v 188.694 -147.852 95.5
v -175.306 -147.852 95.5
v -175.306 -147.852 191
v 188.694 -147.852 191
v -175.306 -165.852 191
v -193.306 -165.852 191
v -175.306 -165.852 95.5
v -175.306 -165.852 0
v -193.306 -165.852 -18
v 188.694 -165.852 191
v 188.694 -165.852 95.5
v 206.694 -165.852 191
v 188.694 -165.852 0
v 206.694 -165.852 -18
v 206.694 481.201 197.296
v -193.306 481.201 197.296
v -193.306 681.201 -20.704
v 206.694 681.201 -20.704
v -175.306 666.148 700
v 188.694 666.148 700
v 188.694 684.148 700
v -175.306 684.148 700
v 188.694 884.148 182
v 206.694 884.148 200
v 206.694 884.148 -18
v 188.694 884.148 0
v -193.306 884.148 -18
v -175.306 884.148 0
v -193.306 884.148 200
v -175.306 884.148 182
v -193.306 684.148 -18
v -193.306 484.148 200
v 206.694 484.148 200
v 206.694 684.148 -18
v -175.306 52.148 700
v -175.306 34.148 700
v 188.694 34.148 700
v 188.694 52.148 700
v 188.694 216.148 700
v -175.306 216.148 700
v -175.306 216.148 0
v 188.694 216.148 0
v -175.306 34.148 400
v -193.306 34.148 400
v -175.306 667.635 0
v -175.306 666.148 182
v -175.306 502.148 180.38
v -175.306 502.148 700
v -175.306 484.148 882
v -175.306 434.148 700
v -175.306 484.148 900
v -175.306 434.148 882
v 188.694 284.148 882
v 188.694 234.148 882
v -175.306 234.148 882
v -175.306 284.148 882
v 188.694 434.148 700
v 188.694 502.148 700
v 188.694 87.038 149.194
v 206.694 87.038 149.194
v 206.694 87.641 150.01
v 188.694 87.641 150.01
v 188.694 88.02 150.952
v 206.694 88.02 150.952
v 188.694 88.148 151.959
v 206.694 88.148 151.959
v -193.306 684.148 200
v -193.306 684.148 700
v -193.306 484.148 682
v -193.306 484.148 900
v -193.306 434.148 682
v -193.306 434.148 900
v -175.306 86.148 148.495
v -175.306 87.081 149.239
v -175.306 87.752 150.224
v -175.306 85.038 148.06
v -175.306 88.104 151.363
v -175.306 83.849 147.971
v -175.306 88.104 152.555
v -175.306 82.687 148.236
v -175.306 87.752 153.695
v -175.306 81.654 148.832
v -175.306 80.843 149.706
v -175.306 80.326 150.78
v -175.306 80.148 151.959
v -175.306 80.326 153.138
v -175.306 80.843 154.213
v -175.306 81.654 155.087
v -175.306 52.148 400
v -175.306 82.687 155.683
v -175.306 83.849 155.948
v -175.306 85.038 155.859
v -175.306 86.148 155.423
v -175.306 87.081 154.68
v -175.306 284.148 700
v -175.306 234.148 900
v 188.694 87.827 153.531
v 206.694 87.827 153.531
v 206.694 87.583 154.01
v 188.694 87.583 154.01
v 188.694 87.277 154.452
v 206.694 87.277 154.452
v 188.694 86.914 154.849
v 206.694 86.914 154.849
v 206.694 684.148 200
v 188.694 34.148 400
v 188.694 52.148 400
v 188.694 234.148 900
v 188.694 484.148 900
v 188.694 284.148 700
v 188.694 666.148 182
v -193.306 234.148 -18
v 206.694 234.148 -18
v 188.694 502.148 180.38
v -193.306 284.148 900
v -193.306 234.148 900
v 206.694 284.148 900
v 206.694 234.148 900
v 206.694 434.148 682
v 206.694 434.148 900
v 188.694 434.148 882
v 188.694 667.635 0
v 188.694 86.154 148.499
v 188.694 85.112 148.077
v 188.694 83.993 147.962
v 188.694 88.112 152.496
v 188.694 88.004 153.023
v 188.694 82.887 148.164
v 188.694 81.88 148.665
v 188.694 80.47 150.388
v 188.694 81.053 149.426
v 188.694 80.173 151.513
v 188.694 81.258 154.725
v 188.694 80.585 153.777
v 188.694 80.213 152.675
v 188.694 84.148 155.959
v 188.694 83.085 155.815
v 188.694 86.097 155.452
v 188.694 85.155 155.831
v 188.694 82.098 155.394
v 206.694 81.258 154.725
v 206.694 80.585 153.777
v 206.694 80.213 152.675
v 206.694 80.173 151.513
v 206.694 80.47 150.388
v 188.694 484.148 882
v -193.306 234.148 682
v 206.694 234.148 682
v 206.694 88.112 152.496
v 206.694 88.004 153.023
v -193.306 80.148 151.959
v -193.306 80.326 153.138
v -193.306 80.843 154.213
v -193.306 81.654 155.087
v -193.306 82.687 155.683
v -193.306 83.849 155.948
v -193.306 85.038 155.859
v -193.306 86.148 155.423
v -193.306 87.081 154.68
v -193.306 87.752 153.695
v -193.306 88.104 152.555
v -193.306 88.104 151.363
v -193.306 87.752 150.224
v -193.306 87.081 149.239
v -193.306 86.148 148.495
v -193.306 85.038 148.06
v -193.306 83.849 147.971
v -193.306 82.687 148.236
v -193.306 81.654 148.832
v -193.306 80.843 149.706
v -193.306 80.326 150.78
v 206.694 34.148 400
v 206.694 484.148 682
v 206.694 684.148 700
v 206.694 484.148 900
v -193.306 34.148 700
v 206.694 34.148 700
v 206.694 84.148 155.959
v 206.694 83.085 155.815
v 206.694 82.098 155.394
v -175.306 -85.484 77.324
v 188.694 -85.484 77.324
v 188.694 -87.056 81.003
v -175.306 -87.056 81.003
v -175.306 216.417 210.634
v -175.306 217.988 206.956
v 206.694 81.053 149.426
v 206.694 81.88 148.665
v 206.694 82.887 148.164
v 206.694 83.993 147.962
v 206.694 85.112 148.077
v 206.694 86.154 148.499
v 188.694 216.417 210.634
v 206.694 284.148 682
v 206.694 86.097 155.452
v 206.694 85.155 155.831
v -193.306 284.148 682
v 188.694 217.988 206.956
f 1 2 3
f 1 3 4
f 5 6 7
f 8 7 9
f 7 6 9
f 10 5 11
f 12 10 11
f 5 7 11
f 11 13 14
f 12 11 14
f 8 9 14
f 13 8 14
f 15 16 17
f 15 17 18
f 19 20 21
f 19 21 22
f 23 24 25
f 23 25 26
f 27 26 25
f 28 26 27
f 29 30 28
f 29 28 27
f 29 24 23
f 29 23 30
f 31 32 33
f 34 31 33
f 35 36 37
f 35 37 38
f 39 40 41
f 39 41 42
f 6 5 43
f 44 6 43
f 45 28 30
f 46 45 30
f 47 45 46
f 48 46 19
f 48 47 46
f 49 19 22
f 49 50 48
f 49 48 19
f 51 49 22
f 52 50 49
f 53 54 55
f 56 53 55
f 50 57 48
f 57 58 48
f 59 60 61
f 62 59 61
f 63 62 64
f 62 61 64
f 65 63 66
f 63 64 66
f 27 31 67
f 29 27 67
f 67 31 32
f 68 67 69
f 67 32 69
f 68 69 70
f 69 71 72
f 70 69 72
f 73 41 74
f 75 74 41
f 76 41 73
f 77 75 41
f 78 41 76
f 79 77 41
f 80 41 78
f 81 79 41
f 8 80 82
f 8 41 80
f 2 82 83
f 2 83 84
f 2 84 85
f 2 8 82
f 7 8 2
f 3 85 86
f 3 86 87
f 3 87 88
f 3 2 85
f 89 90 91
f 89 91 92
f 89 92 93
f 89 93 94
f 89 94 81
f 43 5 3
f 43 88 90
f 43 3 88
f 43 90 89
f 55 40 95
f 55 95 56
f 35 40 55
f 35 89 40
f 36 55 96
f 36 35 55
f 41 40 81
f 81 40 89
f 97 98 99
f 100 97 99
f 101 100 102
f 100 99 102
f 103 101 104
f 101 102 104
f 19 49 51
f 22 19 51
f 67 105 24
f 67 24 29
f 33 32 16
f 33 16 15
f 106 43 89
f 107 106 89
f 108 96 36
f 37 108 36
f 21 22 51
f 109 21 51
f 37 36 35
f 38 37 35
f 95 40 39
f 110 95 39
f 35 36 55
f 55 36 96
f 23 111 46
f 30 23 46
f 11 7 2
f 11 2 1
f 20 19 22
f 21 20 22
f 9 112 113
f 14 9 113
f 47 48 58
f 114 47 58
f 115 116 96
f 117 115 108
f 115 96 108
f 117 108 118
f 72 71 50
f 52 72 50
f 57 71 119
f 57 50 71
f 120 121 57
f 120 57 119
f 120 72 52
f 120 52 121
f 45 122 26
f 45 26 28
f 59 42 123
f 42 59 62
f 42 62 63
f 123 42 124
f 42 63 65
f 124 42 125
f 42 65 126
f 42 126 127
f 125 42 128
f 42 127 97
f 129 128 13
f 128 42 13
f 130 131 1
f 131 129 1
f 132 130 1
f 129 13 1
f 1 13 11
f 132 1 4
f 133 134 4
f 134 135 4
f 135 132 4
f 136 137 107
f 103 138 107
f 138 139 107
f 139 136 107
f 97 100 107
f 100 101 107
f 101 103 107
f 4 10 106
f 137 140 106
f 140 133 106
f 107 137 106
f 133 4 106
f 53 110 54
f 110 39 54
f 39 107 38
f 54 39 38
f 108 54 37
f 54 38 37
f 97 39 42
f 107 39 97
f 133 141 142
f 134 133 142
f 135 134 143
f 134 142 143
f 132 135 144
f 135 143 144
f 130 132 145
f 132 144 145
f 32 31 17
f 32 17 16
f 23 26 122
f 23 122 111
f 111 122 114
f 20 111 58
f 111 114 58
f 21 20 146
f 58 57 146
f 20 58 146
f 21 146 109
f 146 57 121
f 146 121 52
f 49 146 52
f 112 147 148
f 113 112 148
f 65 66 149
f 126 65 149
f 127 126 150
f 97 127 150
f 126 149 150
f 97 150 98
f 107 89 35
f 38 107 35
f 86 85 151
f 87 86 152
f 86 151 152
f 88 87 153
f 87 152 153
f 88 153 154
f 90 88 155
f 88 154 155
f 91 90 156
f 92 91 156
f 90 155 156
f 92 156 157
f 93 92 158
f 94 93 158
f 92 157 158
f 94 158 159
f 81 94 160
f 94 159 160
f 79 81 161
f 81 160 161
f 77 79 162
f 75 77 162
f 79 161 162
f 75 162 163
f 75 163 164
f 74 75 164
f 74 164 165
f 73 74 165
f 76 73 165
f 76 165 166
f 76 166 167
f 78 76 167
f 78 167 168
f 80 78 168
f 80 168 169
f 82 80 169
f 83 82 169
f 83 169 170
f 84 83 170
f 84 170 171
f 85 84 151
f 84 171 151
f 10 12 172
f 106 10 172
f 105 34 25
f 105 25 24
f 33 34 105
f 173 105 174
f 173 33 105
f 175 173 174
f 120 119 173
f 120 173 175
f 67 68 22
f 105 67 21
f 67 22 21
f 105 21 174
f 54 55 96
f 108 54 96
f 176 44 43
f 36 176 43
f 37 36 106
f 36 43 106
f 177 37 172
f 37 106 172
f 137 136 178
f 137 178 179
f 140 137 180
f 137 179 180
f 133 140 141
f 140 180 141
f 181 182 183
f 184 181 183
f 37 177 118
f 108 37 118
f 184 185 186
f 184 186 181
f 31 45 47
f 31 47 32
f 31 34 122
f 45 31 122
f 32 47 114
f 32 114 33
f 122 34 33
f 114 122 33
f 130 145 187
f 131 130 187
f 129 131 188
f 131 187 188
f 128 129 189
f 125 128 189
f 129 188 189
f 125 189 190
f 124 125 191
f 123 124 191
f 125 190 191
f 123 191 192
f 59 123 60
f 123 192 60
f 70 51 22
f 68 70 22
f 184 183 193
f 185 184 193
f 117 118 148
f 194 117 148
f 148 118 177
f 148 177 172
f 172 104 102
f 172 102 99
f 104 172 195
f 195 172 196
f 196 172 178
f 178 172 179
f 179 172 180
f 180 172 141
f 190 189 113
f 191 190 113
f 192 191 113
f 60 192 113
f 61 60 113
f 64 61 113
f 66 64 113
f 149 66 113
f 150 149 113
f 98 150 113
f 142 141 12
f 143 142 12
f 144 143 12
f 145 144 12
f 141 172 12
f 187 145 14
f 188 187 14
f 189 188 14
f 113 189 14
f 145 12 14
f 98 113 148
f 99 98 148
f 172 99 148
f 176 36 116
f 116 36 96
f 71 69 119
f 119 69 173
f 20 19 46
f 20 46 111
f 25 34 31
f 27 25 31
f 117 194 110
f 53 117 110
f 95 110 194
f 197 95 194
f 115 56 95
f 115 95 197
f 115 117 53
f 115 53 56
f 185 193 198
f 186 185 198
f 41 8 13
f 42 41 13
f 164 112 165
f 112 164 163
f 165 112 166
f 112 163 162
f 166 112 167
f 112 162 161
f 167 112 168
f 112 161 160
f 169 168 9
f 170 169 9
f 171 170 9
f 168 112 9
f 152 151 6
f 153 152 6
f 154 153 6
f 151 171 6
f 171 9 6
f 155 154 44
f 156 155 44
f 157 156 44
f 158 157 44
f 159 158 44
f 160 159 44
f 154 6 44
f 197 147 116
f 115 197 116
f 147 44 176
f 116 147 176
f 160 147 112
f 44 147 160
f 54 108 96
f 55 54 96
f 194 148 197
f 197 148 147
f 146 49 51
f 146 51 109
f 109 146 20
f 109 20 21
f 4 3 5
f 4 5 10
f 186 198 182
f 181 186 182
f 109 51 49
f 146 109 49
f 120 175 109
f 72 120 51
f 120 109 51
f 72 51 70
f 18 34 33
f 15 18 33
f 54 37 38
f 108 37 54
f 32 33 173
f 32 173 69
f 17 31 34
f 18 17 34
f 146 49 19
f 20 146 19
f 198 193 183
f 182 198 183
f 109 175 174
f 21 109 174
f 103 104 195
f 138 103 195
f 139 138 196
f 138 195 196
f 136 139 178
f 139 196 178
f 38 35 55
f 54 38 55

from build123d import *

# Parameters (mm, degrees)
F0_W      = 400
F0_H      = 400
F1_DEPTH  = 18
F3_DEPTH  = 400
F2_W      = 364
F2_H      = 18
F4_DEPTH  = 700
F6_DEPTH  = 191
F7_W      = 364
F7_H      = 95.5
F8_DEPTH  = 25
F9_DEPTH  = 400.001
F10_DEPTH = 300
F11_DEPTH = 300
F12_W     = 18
F12_H     = 300
F13_DEPTH = 364
F16_DEPTH = 364
F17_DEPTH = 18
F18_R     = 4
F19_DEPTH = 18
F20_W     = 18
F20_H     = 200
F21_DEPTH = 200
F23_DEPTH = 400.001
F24_W     = 18
F24_H     = 18
F24_W_2   = 364
F24_H_2   = 182
F25_DEPTH = 50
F27_W     = 400
F27_H     = 218
F27_W_2   = 364
F27_H_2   = 182
F28_DEPTH = 200
F29_W     = 364
F29_H     = 18
F30_DEPTH = 700
F31_DEPTH = 25
F33_DEPTH = 400.001
F35_DEPTH = 364
F36_W     = 18
F36_H     = 182
F37_DEPTH = 50
F38_W     = 364
F38_H     = 18
F39_DEPTH = 25
F41_DEPTH = 364
F42_W     = 364
F42_H     = 182
F43_DEPTH = 25
F42_W_2   = 400
F42_H_2   = 218
F44_DEPTH = 200
F46_DEPTH = 400.001
F47_W     = 400
F47_H     = 295.8445537778
F48_DEPTH = 4


with BuildPart() as f1:
    # F0 (on Top) → F1 (new body)
    with BuildSketch(Plane.XY):
        with Locations((6.6944919527, 34.1483235822)):
            Rectangle(F0_W, F0_H)
    extrude(amount=-F1_DEPTH)

    # F2 (on face) → F3 (join)
    with BuildSketch(Plane.XY):
        Polygon((-175.3055080473, 216.1483235822), (-175.3055080473, 234.1483235822), (-193.3055080473, 234.1483235822), (-193.3055080473, -165.8516764178), (-175.3055080473, -165.8516764178), (-175.3055080473, -147.8516764178), align=None)
        Polygon((206.6944919527, -165.8516764178), (206.6944919527, 234.1483235822), (188.6944919527, 234.1483235822), (188.6944919527, 216.1483235822), (188.6944919527, -147.8516764178), (188.6944919527, -165.8516764178), align=None)
    extrude(amount=F3_DEPTH)

    # F2 (on face) → F4 (join)
    with BuildSketch(Plane.XY):
        with Locations((6.6944919527, 225.1483235822)):
            Rectangle(F2_W, F2_H)
    extrude(amount=F4_DEPTH)

    # F2 (on face) → F6 (join)
    with BuildSketch(Plane.XY):
        with Locations((6.6944919527, -156.8516764178)):
            Rectangle(F2_W, F2_H)
    extrude(amount=F6_DEPTH)

    # F7 (on face) → F8 (cut)
    with BuildSketch(Plane.XZ.offset(165.8516764178)):
        with Locations((6.6944919527, 47.75)):
            Rectangle(F7_W, F7_H)
    extrude(amount=-F8_DEPTH, mode=Mode.SUBTRACT)

    # F5 (on face) → F9 (cut, through all)
    with BuildSketch(Plane.YZ.offset(206.6944919527)):
        Polygon((-165.8516764178, 400), (-165.8516764178, 191), (34.1483235822, 400), align=None)
    extrude(amount=-F9_DEPTH, mode=Mode.SUBTRACT)

    # F10 (add): a face of the model
    f10_faces = [f1.faces().sort_by_distance(p)[0] for p in [
        (-184.3055080473, 134.1483235822, 400),
    ]]
    extrude(f10_faces, amount=F10_DEPTH)

    # F11 (add): a face of the model
    f11_faces = [f1.faces().sort_by_distance(p)[0] for p in [
        (197.6944919527, 134.1483235822, 400),
    ]]
    extrude(f11_faces, amount=F11_DEPTH)

    # F12 (on face) → F13 (join, through all)
    with BuildSketch(Plane.YZ.offset(-175.3055080473)):
        with Locations((43.1483235822, 550)):
            Rectangle(F12_W, F12_H)
    extrude(amount=F13_DEPTH)

    # F14 (on face) → F17 (cut)
    with BuildSketch(Plane.YZ.offset(206.6944919527)):
        with BuildLine():
            Line((87.0382903364, 149.1938117185), (84.1483235822, 151.9593301435))
            Line((84.1483235822, 151.9593301435), (80.4698678124, 150.3880366796))
            ThreePointArc((80.4698678124, 150.3880366796), (83.4328013629, 148.0238469517), (87.0382903364, 149.1938117185))
        make_face()
        with BuildLine():
            Line((84.1483235822, 151.9593301435), (81.258356828, 154.7248485686))
            ThreePointArc((81.258356828, 154.7248485686), (80.2128403903, 152.6748523629), (80.4698678124, 150.3880366796))
            Line((80.4698678124, 150.3880366796), (84.1483235822, 151.9593301435))
        make_face()
        with BuildLine():
            ThreePointArc((84.1483235822, 155.9593301435), (82.5770301183, 155.6377859133), (81.258356828, 154.7248485686))
            Line((81.258356828, 154.7248485686), (84.1483235822, 151.9593301435))
            Line((84.1483235822, 151.9593301435), (84.1483235822, 155.9593301435))
        make_face()
        with BuildLine():
            Line((84.1483235822, 155.9593301435), (84.1483235822, 151.9593301435))
            Line((84.1483235822, 151.9593301435), (86.9138420073, 154.8492968978))
            ThreePointArc((86.9138420073, 154.8492968978), (85.6383123377, 155.6714634262), (84.1483235822, 155.9593301435))
        make_face()
        with BuildLine():
            Line((86.9138420073, 154.8492968978), (84.1483235822, 151.9593301435))
            Line((84.1483235822, 151.9593301435), (87.826779352, 153.5306236075))
            ThreePointArc((87.826779352, 153.5306236075), (87.4370810478, 154.2361863824), (86.9138420073, 154.8492968978))
        make_face()
        with BuildLine():
            Line((87.826779352, 153.5306236075), (84.1483235822, 151.9593301435))
            Line((84.1483235822, 151.9593301435), (88.1483235822, 151.9593301435))
            ThreePointArc((88.1483235822, 151.9593301435), (88.0671131325, 152.7612581082), (87.826779352, 153.5306236075))
        make_face()
        with BuildLine():
            Line((88.1483235822, 151.9593301435), (84.1483235822, 151.9593301435))
            Line((84.1483235822, 151.9593301435), (87.0382903364, 149.1938117185))
            ThreePointArc((87.0382903364, 149.1938117185), (87.8604568649, 150.469341388), (88.1483235822, 151.9593301435))
        make_face()
    extrude(amount=-F17_DEPTH, mode=Mode.SUBTRACT)

    # F18 (on face) → F19 (cut)
    with BuildSketch(Plane(origin=(-193.3055080473, 0, 0), x_dir=(0, -1, 0), z_dir=(-1, 0, 0))):
        with Locations((-84.1483235822, 151.9593301435)):
            Circle(F18_R)
    extrude(amount=-F19_DEPTH, mode=Mode.SUBTRACT)

    # F20 (on face) → F21 (join)
    with BuildSketch(Plane.XY.offset(700)):
        with Locations((-184.3055080473, 134.1483235822)):
            Rectangle(F20_W, F20_H)
        with Locations((197.6944919527, 134.1483235822)):
            Rectangle(F20_W, F20_H)
    extrude(amount=F21_DEPTH)

    # F22 (on face) → F23 (cut, through all)
    with BuildSketch(Plane.YZ.offset(206.6944919527)):
        Polygon((34.1483235822, 900), (34.1483235822, 700), (234.1483235822, 900), align=None)
    extrude(amount=-F23_DEPTH, mode=Mode.SUBTRACT)

    # F24 (on face) → F25 (join)
    with BuildSketch(Plane(origin=(0, 234.1483235822, 0), x_dir=(-1, 0, 0), z_dir=(0, 1, 0))):
        with Locations((-197.6944919527, 891)):
            Rectangle(F24_W, F24_H)
        with Locations((-6.6944919527, 891)):
            Rectangle(F24_W_2, F24_H)
        with Locations((-197.6944919527, 791)):
            Rectangle(F24_W, F24_H_2)
        with Locations((184.3055080473, 891)):
            Rectangle(F24_W, F24_H)
        Polygon((-188.6944919527, 700), (-206.6944919527, 700), (-206.6944919527, 682), (193.3055080473, 682), (193.3055080473, 700), (175.3055080473, 700), align=None)
        with Locations((184.3055080473, 791)):
            Rectangle(F24_W, F24_H_2)
    extrude(amount=F25_DEPTH)


with BuildPart() as f16:
    # F15 (on face) → F16 (new body, through all)
    with BuildSketch(Plane(origin=(188.6944919527, 0, 0), x_dir=(0, -1, 0), z_dir=(-1, 0, 0))):
        Polygon((87.0555304103, 81.0025175254), (-216.417070596, 210.6342283005), (-217.9883640599, 206.9557725307), (85.4842369464, 77.3240617557), align=None)
    extrude(amount=F16_DEPTH)


with BuildPart() as f28:
    # F27 (on offset) → F28 (new body)
    with BuildSketch(Plane(origin=(0, 484.1483235822, 0), x_dir=(-1, 0, 0), z_dir=(0, 1, 0))):
        with Locations((-6.6944919527, 791)):
            Rectangle(F27_W, F27_H)
        with Locations((-6.6944919527, 791)):
            Rectangle(F27_W_2, F27_H_2, mode=Mode.SUBTRACT)
    extrude(amount=F28_DEPTH)

    # F29 (on face) → F30 (join)
    with BuildSketch(Plane(origin=(0, 0, 682), x_dir=(1, 0, 0), z_dir=(0, 0, -1))):
        Polygon((206.6944919527, -684.1483235822), (206.6944919527, -484.1483235822), (188.6944919527, -484.1483235822), (188.6944919527, -502.1483235822), (188.6944919527, -666.1483235822), (188.6944919527, -684.1483235822), align=None)
        with Locations((6.6944919527, -493.1483235822)):
            Rectangle(F29_W, F29_H)
        Polygon((-175.3055080473, -502.1483235822), (-175.3055080473, -484.1483235822), (-193.3055080473, -484.1483235822), (-193.3055080473, -684.1483235822), (-175.3055080473, -684.1483235822), (-175.3055080473, -666.1483235822), align=None)
        with Locations((6.6944919527, -675.1483235822)):
            Rectangle(F29_W, F29_H)
    extrude(amount=F30_DEPTH)

    # F31 (cut): a face of the model
    f31_faces = [f28.faces().sort_by_distance(p)[0] for p in [
        (6.6944919527, 584.1483235822, 682),
    ]]
    extrude(f31_faces, amount=-F31_DEPTH, mode=Mode.SUBTRACT)

    # F32 (on face) → F33 (cut, through all)
    with BuildSketch(Plane.YZ.offset(206.6944919527)):
        Polygon((484.1483235822, 900), (684.1483235822, 700), (684.1483235822, 900), align=None)
    extrude(amount=-F33_DEPTH, mode=Mode.SUBTRACT)

    # F36 (on face) → F37 (join)
    with BuildSketch(Plane.XZ.offset(-484.1483235822)):
        Polygon((206.6944919527, 900), (-193.3055080473, 900), (-193.3055080473, 882), (-175.3055080473, 882), (188.6944919527, 882), (206.6944919527, 882), align=None)
        with Locations((-184.3055080473, 791)):
            Rectangle(F36_W, F36_H)
        with Locations((197.6944919527, 791)):
            Rectangle(F36_W, F36_H)
        Polygon((-175.3055080473, 700), (-193.3055080473, 700), (-193.3055080473, 682), (206.6944919527, 682), (206.6944919527, 700), (188.6944919527, 700), align=None)
    extrude(amount=F37_DEPTH)

    # F38 (on face) → F39 (cut)
    with BuildSketch(Plane(origin=(0, 0, 882), x_dir=(1, 0, 0), z_dir=(0, 0, -1))):
        with Locations((6.6944919527, -493.1483235822)):
            Rectangle(F38_W, F38_H)
    extrude(amount=-F39_DEPTH, mode=Mode.SUBTRACT)

    # F42 (on face) → F43 (cut)
    with BuildSketch(Plane(origin=(0, 684.1483235822, 0), x_dir=(-1, 0, 0), z_dir=(0, 1, 0))):
        with Locations((-6.6944919527, 91)):
            Rectangle(F42_W, F42_H)
    extrude(amount=-F43_DEPTH, mode=Mode.SUBTRACT)

    # F42 (on face) → F44 (join)
    with BuildSketch(Plane(origin=(0, 684.1483235822, 0), x_dir=(-1, 0, 0), z_dir=(0, 1, 0))):
        with Locations((-6.6944919527, 91)):
            Rectangle(F42_W_2, F42_H_2)
        with Locations((-6.6944919527, 91)):
            Rectangle(F42_W, F42_H, mode=Mode.SUBTRACT)
    extrude(amount=F44_DEPTH)

    # F45 (on face) → F46 (cut, through all)
    with BuildSketch(Plane.YZ.offset(206.6944919527)):
        Polygon((684.1483235822, -18), (484.1483235822, 200), (484.1483235822, -18), align=None)
    extrude(amount=-F46_DEPTH, mode=Mode.SUBTRACT)


with BuildPart() as f35:
    # F34 (on face) → F35 (new body, through all)
    with BuildSketch(Plane.YZ.offset(-175.3055080473)):
        Polygon((234.1483235822, 900), (34.1483235822, 700), (52.1483235822, 700), (234.1483235822, 882), align=None)
    extrude(amount=F35_DEPTH)


with BuildPart() as f41:
    # F40 (on face) → F41 (new body, through all)
    with BuildSketch(Plane.YZ.offset(-175.3055080473)):
        Polygon((684.1483235822, 700), (484.1483235822, 900), (484.1483235822, 882), (666.1483235822, 700), align=None)
    extrude(amount=F41_DEPTH)


with BuildPart() as f48:
    # F47 (on face) → F48 (new body)
    with BuildSketch(Plane(origin=(0, 362.513881106, 332.5815422991), x_dir=(1, 0, 0), z_dir=(0, -0.7368734601, -0.6760306974))):
        with Locations((6.6944919527, -327.8467136809)):
            Rectangle(F47_W, F47_H)
    extrude(amount=F48_DEPTH)


solid = Compound([f1.part, f16.part, f28.part, f35.part, f41.part, f48.part])
